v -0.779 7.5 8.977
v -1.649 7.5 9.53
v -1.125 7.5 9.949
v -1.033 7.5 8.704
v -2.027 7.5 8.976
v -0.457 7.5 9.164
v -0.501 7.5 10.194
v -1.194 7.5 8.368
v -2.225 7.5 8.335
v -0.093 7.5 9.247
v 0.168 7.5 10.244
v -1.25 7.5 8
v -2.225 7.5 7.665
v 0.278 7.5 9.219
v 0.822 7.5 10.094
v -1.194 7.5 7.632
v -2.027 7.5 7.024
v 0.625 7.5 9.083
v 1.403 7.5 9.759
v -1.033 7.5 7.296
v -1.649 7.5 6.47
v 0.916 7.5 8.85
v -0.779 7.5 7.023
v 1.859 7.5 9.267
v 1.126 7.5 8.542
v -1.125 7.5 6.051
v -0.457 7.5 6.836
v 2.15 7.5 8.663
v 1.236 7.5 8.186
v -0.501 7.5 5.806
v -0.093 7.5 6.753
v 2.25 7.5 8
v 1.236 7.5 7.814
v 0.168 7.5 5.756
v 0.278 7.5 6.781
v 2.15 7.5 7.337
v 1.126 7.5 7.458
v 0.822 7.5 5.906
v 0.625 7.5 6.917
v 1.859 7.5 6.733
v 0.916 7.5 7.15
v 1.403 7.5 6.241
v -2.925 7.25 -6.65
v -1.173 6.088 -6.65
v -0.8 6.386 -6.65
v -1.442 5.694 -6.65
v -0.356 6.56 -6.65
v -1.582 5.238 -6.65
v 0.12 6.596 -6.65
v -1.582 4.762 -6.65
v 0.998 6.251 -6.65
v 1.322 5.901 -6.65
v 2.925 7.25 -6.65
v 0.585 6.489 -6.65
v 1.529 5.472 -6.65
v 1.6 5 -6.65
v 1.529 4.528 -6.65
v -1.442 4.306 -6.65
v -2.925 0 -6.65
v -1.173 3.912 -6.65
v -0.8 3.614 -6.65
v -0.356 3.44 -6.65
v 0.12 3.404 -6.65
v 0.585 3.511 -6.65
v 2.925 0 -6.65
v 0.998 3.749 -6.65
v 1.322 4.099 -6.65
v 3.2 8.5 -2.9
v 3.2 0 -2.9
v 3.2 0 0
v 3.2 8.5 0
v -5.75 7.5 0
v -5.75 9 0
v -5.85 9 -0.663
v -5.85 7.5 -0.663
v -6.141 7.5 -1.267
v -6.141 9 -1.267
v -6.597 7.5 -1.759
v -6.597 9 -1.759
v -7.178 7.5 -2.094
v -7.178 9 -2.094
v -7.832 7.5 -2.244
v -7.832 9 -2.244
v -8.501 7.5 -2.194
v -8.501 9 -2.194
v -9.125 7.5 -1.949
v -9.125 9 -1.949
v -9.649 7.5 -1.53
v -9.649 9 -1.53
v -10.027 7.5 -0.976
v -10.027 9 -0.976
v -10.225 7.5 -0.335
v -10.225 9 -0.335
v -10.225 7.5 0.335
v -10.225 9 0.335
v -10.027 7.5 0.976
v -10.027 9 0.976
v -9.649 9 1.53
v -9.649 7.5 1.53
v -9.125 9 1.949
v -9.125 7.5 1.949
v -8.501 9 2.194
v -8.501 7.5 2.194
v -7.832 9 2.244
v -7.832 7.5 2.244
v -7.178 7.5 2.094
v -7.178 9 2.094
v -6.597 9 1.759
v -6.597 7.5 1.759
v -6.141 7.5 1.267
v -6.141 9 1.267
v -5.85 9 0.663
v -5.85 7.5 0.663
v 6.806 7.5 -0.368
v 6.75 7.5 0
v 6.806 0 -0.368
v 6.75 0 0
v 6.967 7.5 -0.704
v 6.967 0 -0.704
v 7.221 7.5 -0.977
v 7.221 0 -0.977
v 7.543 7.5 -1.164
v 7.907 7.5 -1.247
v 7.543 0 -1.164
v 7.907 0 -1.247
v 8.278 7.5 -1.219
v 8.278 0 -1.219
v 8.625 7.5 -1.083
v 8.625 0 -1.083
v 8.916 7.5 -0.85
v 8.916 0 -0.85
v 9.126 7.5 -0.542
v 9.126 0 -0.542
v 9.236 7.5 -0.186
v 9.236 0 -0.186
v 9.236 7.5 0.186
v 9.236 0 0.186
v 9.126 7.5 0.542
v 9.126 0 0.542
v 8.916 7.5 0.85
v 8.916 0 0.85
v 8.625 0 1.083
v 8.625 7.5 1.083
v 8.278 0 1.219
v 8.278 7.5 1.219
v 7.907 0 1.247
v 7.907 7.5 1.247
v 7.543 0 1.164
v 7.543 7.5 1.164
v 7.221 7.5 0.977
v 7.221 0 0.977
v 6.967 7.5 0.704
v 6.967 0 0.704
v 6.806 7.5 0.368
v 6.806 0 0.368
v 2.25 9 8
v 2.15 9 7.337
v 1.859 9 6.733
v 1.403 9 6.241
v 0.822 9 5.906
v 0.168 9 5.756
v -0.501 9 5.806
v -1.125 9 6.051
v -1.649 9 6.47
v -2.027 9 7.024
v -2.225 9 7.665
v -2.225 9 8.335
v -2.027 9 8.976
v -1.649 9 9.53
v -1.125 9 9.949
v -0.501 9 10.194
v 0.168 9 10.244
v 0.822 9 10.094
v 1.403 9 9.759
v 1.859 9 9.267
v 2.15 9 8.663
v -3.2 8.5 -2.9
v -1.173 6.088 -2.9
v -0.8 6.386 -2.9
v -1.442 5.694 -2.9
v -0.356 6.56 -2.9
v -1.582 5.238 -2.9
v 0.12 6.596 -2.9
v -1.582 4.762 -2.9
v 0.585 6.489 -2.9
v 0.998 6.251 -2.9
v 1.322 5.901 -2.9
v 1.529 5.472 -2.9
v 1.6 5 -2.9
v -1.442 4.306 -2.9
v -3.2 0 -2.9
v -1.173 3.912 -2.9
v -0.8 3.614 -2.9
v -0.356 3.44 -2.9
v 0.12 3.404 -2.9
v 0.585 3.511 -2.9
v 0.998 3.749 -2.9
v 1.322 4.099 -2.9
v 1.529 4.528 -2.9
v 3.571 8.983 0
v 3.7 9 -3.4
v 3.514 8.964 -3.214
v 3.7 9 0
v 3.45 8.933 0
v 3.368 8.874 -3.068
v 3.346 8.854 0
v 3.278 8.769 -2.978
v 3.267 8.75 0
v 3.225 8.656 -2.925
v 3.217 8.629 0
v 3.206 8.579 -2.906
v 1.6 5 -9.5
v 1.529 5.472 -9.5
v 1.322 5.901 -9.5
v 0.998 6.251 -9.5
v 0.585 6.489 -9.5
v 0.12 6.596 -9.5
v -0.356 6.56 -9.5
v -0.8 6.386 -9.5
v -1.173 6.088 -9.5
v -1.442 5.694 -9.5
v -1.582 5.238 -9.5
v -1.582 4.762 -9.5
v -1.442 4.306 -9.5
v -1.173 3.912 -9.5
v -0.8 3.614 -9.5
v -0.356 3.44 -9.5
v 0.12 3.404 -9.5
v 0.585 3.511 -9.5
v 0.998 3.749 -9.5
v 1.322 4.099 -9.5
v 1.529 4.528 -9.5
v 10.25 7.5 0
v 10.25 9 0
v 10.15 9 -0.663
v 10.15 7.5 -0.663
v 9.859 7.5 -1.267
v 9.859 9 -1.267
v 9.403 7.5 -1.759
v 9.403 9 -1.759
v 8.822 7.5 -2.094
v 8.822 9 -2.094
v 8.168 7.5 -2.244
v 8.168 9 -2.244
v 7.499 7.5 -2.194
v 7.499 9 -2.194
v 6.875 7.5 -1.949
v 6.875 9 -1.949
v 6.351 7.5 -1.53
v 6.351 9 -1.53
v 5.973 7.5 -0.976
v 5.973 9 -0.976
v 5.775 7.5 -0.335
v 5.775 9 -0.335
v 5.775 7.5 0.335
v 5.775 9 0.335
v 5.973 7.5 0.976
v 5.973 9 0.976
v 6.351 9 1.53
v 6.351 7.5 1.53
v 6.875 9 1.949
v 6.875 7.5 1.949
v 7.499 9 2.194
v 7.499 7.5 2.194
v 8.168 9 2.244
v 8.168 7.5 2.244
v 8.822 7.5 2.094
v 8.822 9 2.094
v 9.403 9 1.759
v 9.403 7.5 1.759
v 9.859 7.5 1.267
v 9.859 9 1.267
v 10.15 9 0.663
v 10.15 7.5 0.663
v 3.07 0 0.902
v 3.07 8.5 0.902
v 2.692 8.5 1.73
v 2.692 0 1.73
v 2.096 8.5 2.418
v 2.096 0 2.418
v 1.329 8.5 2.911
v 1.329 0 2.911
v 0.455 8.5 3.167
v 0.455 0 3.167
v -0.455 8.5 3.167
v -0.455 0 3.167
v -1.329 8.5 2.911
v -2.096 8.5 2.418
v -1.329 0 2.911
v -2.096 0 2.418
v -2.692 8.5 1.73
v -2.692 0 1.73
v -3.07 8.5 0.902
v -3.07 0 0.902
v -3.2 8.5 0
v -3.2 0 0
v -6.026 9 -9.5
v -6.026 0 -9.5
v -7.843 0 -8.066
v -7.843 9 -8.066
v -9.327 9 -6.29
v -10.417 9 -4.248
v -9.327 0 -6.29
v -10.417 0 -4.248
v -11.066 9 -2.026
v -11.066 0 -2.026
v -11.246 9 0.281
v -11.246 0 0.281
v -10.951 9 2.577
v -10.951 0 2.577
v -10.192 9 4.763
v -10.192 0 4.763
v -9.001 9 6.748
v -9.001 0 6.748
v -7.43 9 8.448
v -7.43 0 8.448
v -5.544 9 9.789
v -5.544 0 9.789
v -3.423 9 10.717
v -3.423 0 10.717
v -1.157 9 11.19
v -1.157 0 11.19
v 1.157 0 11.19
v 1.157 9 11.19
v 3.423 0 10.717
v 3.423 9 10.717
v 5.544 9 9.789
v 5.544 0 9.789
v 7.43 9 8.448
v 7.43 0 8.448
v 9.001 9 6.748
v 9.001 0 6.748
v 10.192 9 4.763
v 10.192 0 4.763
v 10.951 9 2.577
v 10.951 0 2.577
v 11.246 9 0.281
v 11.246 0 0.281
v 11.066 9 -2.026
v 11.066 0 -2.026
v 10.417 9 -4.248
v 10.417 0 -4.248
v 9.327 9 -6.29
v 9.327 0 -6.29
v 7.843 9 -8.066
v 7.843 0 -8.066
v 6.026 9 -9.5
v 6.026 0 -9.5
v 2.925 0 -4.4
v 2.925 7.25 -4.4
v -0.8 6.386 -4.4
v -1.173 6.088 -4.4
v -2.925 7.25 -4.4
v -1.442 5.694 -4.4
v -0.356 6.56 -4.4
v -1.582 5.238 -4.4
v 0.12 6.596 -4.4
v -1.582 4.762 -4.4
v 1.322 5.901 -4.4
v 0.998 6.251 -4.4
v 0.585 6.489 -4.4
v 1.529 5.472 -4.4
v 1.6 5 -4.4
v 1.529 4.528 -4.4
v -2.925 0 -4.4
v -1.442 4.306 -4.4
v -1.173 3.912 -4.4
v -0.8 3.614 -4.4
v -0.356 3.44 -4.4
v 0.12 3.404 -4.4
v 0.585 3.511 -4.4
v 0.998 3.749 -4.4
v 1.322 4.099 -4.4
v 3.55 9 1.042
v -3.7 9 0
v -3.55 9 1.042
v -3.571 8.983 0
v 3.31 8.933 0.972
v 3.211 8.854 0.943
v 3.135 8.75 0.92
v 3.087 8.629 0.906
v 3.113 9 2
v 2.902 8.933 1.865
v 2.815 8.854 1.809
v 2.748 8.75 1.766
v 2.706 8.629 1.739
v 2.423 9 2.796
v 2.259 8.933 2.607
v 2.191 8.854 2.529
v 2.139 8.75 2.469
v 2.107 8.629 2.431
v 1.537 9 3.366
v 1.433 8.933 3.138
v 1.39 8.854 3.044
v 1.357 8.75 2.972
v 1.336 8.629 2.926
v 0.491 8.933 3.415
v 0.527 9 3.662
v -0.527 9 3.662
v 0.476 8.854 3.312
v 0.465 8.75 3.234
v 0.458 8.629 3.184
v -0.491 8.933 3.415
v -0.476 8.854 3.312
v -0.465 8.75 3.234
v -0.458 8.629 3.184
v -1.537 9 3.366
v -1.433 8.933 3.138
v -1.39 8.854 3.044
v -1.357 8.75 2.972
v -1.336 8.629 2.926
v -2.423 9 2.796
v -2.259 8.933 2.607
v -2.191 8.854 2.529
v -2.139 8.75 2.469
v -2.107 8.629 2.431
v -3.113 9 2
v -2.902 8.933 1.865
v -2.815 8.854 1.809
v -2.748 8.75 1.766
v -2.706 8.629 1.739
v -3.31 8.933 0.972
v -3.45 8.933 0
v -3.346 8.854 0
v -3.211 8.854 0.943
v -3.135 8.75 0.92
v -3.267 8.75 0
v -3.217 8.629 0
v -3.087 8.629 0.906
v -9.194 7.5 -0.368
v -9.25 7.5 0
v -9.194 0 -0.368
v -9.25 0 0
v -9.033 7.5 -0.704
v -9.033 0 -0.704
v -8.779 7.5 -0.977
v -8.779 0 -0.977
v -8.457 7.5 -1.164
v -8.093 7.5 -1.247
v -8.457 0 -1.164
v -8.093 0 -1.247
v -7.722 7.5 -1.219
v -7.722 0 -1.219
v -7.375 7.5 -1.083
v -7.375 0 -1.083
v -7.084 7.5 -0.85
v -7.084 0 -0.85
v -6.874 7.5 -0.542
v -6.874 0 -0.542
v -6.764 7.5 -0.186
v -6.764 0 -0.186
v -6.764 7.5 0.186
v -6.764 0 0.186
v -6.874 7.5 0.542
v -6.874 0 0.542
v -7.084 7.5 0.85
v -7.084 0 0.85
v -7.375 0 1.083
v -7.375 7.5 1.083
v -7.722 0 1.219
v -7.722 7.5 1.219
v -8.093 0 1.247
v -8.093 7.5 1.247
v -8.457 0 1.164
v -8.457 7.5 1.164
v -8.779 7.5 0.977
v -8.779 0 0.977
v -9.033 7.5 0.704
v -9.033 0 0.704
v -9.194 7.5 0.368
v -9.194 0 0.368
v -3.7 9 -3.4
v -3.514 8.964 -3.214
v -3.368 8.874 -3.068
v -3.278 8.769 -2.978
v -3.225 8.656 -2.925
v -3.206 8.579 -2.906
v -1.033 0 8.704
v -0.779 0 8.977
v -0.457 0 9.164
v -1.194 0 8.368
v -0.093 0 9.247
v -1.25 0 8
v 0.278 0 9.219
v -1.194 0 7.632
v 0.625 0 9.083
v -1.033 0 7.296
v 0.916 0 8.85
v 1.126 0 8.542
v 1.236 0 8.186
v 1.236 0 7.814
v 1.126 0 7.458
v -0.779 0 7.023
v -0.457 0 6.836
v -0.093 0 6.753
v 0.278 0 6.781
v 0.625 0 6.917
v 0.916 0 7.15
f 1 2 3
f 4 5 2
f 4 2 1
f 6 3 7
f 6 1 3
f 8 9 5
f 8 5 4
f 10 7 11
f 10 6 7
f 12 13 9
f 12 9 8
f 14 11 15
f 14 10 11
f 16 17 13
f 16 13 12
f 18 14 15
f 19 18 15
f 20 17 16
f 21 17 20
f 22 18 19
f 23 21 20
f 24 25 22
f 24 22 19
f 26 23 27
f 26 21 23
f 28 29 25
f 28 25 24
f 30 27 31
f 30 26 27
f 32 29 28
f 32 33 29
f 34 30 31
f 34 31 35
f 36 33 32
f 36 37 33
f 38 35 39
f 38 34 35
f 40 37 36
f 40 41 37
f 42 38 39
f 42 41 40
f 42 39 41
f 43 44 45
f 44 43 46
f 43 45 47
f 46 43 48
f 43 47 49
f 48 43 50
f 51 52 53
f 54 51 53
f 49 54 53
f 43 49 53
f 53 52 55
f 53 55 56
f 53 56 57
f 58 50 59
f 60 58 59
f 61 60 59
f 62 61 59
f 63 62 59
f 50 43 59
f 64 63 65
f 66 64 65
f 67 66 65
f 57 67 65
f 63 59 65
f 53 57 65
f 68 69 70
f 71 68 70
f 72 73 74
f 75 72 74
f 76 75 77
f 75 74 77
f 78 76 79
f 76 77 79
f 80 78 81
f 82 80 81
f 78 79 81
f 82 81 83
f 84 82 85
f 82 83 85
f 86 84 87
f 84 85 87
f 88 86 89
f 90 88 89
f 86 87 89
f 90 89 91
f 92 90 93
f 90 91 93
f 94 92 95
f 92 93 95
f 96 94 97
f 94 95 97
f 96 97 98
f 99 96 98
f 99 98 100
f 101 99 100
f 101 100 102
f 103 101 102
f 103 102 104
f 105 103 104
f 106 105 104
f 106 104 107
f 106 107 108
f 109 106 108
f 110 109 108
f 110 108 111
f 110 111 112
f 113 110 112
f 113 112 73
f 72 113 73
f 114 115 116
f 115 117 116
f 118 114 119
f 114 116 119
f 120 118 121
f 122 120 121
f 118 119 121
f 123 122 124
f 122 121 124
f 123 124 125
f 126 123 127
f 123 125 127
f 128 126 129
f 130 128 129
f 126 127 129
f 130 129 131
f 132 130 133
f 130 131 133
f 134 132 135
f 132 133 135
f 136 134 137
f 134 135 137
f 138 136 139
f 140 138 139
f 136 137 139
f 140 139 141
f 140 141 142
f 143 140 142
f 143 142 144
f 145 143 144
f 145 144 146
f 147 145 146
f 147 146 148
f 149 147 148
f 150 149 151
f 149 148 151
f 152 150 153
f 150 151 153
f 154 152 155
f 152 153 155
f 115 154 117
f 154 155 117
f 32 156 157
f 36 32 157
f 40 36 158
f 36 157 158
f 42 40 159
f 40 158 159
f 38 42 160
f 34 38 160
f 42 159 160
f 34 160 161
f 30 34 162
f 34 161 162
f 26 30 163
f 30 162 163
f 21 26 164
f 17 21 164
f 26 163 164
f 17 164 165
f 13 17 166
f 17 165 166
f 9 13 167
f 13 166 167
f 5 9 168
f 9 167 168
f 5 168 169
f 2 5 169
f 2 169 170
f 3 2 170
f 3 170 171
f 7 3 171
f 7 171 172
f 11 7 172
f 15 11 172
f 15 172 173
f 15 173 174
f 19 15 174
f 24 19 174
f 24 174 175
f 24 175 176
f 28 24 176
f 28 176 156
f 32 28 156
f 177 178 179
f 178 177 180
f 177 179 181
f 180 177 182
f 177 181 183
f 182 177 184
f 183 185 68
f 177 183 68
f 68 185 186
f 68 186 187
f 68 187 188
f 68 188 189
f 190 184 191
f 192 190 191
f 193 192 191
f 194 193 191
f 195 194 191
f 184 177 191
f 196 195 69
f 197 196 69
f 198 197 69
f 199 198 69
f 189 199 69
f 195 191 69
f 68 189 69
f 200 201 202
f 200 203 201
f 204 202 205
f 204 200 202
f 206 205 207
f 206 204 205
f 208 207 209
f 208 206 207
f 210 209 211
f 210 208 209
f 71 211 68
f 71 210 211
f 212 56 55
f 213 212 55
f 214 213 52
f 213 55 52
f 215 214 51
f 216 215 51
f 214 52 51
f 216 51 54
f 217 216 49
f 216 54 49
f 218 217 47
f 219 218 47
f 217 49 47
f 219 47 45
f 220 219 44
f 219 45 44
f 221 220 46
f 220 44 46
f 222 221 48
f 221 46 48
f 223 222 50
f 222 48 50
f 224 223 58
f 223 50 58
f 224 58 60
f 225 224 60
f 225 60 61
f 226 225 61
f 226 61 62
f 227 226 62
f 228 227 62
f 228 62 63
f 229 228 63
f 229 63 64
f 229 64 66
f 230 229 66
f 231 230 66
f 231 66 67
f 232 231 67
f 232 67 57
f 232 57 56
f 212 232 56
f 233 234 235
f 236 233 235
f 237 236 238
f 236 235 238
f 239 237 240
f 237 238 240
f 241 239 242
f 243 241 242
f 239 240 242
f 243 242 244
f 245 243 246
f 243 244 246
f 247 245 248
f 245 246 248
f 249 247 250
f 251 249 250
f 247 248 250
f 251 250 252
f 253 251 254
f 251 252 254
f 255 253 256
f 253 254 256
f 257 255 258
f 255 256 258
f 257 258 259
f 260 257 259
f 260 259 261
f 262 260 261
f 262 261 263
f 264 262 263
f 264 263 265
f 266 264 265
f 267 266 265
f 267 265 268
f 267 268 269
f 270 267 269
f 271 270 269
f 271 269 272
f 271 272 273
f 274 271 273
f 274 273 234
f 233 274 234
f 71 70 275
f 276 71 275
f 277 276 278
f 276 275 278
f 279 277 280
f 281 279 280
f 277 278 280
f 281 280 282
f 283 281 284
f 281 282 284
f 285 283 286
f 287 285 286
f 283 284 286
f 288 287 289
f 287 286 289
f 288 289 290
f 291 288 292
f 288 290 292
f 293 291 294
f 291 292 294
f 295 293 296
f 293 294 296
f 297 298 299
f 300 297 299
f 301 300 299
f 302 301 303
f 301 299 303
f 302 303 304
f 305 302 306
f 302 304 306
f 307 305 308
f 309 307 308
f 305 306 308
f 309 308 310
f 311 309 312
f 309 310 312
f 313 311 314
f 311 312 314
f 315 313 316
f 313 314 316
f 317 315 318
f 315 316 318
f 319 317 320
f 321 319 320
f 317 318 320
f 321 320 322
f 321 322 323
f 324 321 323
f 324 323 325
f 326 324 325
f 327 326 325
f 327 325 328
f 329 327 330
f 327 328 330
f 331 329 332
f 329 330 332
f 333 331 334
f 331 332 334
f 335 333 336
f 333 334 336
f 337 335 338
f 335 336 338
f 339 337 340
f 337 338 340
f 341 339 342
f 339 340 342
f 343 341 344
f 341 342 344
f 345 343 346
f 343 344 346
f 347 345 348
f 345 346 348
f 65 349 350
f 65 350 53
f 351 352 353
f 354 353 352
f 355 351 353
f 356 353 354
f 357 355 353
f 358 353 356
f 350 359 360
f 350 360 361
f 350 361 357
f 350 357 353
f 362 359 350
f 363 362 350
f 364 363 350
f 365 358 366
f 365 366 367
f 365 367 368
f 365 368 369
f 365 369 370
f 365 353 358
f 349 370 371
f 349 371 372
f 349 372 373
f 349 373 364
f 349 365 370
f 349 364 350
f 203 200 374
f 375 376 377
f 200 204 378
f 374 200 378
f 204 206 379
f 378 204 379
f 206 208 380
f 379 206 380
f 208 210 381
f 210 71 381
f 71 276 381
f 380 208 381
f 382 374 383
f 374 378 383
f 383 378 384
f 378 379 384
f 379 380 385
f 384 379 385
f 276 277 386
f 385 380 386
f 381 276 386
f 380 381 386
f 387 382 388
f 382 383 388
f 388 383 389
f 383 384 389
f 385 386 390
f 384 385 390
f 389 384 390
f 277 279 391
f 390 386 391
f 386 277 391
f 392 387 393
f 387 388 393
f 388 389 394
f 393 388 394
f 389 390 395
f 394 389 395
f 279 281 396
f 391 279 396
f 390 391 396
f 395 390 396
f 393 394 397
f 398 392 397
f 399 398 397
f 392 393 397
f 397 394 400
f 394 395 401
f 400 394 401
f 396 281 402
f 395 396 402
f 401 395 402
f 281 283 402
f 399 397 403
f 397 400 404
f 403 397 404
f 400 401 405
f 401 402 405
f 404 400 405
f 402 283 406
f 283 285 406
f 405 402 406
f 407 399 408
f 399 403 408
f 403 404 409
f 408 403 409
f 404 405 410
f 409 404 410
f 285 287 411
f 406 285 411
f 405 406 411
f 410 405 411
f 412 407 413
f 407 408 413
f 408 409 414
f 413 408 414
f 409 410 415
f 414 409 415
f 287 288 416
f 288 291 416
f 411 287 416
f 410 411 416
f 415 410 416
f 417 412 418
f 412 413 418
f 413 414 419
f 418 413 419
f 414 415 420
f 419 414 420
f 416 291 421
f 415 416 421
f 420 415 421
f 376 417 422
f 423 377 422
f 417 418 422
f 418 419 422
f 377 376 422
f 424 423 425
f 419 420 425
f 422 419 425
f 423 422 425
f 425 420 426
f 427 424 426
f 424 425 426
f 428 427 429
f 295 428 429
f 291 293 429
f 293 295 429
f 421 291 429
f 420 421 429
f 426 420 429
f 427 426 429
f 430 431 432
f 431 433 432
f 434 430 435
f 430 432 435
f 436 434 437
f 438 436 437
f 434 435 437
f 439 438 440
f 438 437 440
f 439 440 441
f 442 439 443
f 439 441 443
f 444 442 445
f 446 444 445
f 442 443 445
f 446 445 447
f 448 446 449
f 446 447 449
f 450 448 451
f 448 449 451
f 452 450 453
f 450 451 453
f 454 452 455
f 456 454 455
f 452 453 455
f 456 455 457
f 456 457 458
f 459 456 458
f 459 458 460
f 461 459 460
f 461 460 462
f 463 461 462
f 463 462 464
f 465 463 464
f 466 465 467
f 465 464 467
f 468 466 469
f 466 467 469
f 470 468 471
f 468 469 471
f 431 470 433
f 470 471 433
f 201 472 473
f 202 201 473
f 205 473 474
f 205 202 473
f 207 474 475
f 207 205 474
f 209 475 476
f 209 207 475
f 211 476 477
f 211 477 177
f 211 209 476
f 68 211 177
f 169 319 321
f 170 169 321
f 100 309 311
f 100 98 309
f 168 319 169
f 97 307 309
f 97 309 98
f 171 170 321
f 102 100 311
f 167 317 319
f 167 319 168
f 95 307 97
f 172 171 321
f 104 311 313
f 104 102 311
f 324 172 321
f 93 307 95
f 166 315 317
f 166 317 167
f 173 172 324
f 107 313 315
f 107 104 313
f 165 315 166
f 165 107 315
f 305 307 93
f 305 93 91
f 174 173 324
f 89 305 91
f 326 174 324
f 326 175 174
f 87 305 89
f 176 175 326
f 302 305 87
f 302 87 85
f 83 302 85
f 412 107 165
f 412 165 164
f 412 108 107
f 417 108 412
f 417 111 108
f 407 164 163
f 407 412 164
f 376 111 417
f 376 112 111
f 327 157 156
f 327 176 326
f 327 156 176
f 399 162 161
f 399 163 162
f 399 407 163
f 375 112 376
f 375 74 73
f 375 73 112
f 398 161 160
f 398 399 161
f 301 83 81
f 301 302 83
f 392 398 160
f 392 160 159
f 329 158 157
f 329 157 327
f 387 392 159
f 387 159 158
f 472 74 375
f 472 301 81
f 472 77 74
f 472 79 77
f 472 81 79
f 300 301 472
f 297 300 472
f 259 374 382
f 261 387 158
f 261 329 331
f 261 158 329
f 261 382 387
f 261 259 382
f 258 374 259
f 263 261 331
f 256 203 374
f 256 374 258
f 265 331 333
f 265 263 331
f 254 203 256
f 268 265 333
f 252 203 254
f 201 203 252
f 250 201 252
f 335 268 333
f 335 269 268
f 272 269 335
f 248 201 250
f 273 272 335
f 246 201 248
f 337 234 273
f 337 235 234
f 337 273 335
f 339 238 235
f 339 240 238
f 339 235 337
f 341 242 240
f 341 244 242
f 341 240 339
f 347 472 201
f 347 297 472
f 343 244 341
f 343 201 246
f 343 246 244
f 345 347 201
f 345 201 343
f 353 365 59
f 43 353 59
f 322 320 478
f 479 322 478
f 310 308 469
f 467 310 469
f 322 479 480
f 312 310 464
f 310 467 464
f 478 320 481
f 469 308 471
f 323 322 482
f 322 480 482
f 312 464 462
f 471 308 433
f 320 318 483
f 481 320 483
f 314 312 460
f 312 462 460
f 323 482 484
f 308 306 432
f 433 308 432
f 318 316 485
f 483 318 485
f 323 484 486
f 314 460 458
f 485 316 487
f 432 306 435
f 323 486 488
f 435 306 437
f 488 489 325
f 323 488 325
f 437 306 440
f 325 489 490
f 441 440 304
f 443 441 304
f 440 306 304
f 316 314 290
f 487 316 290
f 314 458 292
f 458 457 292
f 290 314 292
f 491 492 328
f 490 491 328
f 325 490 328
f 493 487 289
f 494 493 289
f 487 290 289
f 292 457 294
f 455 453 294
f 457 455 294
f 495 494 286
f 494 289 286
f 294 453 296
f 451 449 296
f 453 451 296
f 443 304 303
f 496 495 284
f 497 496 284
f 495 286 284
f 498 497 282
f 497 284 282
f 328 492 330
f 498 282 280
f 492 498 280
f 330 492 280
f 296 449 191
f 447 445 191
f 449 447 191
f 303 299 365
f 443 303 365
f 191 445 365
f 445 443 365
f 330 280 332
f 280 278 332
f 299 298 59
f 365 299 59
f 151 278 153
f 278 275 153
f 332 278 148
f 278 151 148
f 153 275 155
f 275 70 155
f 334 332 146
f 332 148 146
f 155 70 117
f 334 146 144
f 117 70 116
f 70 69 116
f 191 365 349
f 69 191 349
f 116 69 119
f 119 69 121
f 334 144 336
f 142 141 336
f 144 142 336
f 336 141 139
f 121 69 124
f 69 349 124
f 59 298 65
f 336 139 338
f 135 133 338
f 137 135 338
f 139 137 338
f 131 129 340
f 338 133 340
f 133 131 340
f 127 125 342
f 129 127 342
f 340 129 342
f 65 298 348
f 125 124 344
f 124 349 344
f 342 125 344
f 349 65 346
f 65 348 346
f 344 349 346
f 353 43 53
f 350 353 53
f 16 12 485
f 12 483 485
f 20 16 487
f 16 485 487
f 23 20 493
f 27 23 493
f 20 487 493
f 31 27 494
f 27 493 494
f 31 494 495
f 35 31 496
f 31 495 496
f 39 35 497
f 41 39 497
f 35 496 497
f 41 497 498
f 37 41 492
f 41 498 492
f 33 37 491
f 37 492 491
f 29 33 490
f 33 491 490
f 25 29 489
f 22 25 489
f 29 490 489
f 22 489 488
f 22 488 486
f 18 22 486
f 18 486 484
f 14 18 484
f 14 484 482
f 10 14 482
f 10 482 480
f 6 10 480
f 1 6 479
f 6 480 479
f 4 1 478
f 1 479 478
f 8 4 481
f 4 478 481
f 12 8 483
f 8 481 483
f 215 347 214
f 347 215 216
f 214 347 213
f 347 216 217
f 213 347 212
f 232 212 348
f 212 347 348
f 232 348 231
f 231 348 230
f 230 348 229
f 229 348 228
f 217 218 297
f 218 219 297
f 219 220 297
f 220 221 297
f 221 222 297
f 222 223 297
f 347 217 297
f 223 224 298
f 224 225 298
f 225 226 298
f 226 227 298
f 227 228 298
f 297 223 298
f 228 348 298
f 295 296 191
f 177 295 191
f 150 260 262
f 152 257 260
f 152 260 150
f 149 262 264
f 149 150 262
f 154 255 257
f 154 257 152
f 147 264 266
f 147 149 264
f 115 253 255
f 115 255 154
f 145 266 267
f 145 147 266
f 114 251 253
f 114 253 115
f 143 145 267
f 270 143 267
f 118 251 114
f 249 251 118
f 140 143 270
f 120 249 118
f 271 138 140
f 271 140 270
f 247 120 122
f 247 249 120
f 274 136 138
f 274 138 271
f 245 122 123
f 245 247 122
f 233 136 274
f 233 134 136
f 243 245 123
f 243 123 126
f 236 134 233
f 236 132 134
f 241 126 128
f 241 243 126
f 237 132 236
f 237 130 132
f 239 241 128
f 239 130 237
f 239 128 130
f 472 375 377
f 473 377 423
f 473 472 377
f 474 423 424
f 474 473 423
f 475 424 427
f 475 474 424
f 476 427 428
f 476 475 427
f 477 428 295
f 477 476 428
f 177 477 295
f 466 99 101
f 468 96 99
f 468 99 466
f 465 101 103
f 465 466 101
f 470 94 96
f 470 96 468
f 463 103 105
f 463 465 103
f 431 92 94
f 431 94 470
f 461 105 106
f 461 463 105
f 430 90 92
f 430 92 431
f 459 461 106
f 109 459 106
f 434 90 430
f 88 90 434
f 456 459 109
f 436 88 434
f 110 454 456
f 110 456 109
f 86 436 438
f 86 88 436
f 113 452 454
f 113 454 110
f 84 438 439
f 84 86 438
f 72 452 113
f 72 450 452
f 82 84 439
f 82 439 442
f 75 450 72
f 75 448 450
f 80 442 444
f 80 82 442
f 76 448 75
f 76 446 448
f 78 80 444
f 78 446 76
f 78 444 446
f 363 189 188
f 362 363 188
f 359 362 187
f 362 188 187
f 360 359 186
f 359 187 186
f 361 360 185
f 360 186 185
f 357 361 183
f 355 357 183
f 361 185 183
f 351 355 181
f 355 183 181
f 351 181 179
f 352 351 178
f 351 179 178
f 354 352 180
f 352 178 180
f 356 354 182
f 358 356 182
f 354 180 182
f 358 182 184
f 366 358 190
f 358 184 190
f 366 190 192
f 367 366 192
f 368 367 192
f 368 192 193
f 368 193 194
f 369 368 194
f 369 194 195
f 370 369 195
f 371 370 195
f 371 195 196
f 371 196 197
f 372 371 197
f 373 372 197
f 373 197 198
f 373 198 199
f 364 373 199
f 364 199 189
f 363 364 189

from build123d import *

# Parameters (mm, degrees)
BOSS_EXTRU_1_DEPTH                              = 9
CHAMBRAGE_POUR_VIS_T_TE_CYLINDRIQUE_D           = 2.5
CHAMBRAGE_POUR_VIS_T_TE_CYLINDRIQUE_CBORE_D     = 4.5
CHAMBRAGE_POUR_VIS_T_TE_CYLINDRIQUE_CBORE_DEPTH = 1.5
CONG_1_R                                        = 0.5
ESQUISSE6_R                                     = 1.6
ENL_V_MAT_EXTRU_1_DEPTH                         = 19.27908646
ESQUISSE7_W                                     = 5.85
ESQUISSE7_H                                     = 2.25
ENL_V_MAT_EXTRU_2_DEPTH                         = 7.25


with BuildPart() as part:
    # Esquisse1 → Boss.-Extru.1 (new body)
    with BuildSketch(Plane(origin=(0, 0, 0), x_dir=(1, 0, 0), z_dir=(0, 1, 0))):
        with BuildLine():
            Line((6.025985397, 9.5), (-6.025985397, 9.5))
            ThreePointArc((-6.025985397, 9.5), (0, -11.25), (6.025985397, 9.5))
        make_face()
        with BuildLine():
            Line((-3.2, 0), (-3.2, 2.9))
            Line((-3.2, 2.9), (3.2, 2.9))
            Line((3.2, 2.9), (3.2, 0))
            ThreePointArc((3.2, 0), (0, -3.2), (-3.2, 0))
        make_face(mode=Mode.SUBTRACT)
    extrude(amount=BOSS_EXTRU_1_DEPTH)

    # Chambrage pour vis à tête cylindrique à 6 pans creux (ou vis CHC) M21 (through all)
    with Locations(Plane(origin=(0, 9, 0), x_dir=(1, 0, 0), z_dir=(0, 1, 0))):
        with Locations((8, 0), (-8, 0), (0, 0), (0, -8)):
            CounterBoreHole(CHAMBRAGE_POUR_VIS_T_TE_CYLINDRIQUE_D / 2, CHAMBRAGE_POUR_VIS_T_TE_CYLINDRIQUE_CBORE_D / 2, CHAMBRAGE_POUR_VIS_T_TE_CYLINDRIQUE_CBORE_DEPTH)

    # Congé1
    cong_1_edges = [part.edges().sort_by_distance(p)[0] for p in [
        (0, 9, 3.2),
        (3.2, 9, -1.45),
        (0, 9, -2.9),
        (-3.2, 9, -1.45),
    ]]
    fillet(cong_1_edges, radius=CONG_1_R)

    # Esquisse6 → Enlèv. mat.-Extru.1 (cut, through all)
    with BuildSketch(Plane.XY):
        with Locations((0, 5)):
            Circle(ESQUISSE6_R)
    extrude(amount=-ENL_V_MAT_EXTRU_1_DEPTH, mode=Mode.SUBTRACT)

    # Esquisse7 → Enlèv. mat.-Extru.2 (cut)
    with BuildSketch(Plane(origin=(0, 0, 0), x_dir=(1, 0, 0), z_dir=(0, 1, 0))):
        with Locations((0, 5.525)):
            Rectangle(ESQUISSE7_W, ESQUISSE7_H)
    extrude(amount=ENL_V_MAT_EXTRU_2_DEPTH, mode=Mode.SUBTRACT)


solid = part.part
